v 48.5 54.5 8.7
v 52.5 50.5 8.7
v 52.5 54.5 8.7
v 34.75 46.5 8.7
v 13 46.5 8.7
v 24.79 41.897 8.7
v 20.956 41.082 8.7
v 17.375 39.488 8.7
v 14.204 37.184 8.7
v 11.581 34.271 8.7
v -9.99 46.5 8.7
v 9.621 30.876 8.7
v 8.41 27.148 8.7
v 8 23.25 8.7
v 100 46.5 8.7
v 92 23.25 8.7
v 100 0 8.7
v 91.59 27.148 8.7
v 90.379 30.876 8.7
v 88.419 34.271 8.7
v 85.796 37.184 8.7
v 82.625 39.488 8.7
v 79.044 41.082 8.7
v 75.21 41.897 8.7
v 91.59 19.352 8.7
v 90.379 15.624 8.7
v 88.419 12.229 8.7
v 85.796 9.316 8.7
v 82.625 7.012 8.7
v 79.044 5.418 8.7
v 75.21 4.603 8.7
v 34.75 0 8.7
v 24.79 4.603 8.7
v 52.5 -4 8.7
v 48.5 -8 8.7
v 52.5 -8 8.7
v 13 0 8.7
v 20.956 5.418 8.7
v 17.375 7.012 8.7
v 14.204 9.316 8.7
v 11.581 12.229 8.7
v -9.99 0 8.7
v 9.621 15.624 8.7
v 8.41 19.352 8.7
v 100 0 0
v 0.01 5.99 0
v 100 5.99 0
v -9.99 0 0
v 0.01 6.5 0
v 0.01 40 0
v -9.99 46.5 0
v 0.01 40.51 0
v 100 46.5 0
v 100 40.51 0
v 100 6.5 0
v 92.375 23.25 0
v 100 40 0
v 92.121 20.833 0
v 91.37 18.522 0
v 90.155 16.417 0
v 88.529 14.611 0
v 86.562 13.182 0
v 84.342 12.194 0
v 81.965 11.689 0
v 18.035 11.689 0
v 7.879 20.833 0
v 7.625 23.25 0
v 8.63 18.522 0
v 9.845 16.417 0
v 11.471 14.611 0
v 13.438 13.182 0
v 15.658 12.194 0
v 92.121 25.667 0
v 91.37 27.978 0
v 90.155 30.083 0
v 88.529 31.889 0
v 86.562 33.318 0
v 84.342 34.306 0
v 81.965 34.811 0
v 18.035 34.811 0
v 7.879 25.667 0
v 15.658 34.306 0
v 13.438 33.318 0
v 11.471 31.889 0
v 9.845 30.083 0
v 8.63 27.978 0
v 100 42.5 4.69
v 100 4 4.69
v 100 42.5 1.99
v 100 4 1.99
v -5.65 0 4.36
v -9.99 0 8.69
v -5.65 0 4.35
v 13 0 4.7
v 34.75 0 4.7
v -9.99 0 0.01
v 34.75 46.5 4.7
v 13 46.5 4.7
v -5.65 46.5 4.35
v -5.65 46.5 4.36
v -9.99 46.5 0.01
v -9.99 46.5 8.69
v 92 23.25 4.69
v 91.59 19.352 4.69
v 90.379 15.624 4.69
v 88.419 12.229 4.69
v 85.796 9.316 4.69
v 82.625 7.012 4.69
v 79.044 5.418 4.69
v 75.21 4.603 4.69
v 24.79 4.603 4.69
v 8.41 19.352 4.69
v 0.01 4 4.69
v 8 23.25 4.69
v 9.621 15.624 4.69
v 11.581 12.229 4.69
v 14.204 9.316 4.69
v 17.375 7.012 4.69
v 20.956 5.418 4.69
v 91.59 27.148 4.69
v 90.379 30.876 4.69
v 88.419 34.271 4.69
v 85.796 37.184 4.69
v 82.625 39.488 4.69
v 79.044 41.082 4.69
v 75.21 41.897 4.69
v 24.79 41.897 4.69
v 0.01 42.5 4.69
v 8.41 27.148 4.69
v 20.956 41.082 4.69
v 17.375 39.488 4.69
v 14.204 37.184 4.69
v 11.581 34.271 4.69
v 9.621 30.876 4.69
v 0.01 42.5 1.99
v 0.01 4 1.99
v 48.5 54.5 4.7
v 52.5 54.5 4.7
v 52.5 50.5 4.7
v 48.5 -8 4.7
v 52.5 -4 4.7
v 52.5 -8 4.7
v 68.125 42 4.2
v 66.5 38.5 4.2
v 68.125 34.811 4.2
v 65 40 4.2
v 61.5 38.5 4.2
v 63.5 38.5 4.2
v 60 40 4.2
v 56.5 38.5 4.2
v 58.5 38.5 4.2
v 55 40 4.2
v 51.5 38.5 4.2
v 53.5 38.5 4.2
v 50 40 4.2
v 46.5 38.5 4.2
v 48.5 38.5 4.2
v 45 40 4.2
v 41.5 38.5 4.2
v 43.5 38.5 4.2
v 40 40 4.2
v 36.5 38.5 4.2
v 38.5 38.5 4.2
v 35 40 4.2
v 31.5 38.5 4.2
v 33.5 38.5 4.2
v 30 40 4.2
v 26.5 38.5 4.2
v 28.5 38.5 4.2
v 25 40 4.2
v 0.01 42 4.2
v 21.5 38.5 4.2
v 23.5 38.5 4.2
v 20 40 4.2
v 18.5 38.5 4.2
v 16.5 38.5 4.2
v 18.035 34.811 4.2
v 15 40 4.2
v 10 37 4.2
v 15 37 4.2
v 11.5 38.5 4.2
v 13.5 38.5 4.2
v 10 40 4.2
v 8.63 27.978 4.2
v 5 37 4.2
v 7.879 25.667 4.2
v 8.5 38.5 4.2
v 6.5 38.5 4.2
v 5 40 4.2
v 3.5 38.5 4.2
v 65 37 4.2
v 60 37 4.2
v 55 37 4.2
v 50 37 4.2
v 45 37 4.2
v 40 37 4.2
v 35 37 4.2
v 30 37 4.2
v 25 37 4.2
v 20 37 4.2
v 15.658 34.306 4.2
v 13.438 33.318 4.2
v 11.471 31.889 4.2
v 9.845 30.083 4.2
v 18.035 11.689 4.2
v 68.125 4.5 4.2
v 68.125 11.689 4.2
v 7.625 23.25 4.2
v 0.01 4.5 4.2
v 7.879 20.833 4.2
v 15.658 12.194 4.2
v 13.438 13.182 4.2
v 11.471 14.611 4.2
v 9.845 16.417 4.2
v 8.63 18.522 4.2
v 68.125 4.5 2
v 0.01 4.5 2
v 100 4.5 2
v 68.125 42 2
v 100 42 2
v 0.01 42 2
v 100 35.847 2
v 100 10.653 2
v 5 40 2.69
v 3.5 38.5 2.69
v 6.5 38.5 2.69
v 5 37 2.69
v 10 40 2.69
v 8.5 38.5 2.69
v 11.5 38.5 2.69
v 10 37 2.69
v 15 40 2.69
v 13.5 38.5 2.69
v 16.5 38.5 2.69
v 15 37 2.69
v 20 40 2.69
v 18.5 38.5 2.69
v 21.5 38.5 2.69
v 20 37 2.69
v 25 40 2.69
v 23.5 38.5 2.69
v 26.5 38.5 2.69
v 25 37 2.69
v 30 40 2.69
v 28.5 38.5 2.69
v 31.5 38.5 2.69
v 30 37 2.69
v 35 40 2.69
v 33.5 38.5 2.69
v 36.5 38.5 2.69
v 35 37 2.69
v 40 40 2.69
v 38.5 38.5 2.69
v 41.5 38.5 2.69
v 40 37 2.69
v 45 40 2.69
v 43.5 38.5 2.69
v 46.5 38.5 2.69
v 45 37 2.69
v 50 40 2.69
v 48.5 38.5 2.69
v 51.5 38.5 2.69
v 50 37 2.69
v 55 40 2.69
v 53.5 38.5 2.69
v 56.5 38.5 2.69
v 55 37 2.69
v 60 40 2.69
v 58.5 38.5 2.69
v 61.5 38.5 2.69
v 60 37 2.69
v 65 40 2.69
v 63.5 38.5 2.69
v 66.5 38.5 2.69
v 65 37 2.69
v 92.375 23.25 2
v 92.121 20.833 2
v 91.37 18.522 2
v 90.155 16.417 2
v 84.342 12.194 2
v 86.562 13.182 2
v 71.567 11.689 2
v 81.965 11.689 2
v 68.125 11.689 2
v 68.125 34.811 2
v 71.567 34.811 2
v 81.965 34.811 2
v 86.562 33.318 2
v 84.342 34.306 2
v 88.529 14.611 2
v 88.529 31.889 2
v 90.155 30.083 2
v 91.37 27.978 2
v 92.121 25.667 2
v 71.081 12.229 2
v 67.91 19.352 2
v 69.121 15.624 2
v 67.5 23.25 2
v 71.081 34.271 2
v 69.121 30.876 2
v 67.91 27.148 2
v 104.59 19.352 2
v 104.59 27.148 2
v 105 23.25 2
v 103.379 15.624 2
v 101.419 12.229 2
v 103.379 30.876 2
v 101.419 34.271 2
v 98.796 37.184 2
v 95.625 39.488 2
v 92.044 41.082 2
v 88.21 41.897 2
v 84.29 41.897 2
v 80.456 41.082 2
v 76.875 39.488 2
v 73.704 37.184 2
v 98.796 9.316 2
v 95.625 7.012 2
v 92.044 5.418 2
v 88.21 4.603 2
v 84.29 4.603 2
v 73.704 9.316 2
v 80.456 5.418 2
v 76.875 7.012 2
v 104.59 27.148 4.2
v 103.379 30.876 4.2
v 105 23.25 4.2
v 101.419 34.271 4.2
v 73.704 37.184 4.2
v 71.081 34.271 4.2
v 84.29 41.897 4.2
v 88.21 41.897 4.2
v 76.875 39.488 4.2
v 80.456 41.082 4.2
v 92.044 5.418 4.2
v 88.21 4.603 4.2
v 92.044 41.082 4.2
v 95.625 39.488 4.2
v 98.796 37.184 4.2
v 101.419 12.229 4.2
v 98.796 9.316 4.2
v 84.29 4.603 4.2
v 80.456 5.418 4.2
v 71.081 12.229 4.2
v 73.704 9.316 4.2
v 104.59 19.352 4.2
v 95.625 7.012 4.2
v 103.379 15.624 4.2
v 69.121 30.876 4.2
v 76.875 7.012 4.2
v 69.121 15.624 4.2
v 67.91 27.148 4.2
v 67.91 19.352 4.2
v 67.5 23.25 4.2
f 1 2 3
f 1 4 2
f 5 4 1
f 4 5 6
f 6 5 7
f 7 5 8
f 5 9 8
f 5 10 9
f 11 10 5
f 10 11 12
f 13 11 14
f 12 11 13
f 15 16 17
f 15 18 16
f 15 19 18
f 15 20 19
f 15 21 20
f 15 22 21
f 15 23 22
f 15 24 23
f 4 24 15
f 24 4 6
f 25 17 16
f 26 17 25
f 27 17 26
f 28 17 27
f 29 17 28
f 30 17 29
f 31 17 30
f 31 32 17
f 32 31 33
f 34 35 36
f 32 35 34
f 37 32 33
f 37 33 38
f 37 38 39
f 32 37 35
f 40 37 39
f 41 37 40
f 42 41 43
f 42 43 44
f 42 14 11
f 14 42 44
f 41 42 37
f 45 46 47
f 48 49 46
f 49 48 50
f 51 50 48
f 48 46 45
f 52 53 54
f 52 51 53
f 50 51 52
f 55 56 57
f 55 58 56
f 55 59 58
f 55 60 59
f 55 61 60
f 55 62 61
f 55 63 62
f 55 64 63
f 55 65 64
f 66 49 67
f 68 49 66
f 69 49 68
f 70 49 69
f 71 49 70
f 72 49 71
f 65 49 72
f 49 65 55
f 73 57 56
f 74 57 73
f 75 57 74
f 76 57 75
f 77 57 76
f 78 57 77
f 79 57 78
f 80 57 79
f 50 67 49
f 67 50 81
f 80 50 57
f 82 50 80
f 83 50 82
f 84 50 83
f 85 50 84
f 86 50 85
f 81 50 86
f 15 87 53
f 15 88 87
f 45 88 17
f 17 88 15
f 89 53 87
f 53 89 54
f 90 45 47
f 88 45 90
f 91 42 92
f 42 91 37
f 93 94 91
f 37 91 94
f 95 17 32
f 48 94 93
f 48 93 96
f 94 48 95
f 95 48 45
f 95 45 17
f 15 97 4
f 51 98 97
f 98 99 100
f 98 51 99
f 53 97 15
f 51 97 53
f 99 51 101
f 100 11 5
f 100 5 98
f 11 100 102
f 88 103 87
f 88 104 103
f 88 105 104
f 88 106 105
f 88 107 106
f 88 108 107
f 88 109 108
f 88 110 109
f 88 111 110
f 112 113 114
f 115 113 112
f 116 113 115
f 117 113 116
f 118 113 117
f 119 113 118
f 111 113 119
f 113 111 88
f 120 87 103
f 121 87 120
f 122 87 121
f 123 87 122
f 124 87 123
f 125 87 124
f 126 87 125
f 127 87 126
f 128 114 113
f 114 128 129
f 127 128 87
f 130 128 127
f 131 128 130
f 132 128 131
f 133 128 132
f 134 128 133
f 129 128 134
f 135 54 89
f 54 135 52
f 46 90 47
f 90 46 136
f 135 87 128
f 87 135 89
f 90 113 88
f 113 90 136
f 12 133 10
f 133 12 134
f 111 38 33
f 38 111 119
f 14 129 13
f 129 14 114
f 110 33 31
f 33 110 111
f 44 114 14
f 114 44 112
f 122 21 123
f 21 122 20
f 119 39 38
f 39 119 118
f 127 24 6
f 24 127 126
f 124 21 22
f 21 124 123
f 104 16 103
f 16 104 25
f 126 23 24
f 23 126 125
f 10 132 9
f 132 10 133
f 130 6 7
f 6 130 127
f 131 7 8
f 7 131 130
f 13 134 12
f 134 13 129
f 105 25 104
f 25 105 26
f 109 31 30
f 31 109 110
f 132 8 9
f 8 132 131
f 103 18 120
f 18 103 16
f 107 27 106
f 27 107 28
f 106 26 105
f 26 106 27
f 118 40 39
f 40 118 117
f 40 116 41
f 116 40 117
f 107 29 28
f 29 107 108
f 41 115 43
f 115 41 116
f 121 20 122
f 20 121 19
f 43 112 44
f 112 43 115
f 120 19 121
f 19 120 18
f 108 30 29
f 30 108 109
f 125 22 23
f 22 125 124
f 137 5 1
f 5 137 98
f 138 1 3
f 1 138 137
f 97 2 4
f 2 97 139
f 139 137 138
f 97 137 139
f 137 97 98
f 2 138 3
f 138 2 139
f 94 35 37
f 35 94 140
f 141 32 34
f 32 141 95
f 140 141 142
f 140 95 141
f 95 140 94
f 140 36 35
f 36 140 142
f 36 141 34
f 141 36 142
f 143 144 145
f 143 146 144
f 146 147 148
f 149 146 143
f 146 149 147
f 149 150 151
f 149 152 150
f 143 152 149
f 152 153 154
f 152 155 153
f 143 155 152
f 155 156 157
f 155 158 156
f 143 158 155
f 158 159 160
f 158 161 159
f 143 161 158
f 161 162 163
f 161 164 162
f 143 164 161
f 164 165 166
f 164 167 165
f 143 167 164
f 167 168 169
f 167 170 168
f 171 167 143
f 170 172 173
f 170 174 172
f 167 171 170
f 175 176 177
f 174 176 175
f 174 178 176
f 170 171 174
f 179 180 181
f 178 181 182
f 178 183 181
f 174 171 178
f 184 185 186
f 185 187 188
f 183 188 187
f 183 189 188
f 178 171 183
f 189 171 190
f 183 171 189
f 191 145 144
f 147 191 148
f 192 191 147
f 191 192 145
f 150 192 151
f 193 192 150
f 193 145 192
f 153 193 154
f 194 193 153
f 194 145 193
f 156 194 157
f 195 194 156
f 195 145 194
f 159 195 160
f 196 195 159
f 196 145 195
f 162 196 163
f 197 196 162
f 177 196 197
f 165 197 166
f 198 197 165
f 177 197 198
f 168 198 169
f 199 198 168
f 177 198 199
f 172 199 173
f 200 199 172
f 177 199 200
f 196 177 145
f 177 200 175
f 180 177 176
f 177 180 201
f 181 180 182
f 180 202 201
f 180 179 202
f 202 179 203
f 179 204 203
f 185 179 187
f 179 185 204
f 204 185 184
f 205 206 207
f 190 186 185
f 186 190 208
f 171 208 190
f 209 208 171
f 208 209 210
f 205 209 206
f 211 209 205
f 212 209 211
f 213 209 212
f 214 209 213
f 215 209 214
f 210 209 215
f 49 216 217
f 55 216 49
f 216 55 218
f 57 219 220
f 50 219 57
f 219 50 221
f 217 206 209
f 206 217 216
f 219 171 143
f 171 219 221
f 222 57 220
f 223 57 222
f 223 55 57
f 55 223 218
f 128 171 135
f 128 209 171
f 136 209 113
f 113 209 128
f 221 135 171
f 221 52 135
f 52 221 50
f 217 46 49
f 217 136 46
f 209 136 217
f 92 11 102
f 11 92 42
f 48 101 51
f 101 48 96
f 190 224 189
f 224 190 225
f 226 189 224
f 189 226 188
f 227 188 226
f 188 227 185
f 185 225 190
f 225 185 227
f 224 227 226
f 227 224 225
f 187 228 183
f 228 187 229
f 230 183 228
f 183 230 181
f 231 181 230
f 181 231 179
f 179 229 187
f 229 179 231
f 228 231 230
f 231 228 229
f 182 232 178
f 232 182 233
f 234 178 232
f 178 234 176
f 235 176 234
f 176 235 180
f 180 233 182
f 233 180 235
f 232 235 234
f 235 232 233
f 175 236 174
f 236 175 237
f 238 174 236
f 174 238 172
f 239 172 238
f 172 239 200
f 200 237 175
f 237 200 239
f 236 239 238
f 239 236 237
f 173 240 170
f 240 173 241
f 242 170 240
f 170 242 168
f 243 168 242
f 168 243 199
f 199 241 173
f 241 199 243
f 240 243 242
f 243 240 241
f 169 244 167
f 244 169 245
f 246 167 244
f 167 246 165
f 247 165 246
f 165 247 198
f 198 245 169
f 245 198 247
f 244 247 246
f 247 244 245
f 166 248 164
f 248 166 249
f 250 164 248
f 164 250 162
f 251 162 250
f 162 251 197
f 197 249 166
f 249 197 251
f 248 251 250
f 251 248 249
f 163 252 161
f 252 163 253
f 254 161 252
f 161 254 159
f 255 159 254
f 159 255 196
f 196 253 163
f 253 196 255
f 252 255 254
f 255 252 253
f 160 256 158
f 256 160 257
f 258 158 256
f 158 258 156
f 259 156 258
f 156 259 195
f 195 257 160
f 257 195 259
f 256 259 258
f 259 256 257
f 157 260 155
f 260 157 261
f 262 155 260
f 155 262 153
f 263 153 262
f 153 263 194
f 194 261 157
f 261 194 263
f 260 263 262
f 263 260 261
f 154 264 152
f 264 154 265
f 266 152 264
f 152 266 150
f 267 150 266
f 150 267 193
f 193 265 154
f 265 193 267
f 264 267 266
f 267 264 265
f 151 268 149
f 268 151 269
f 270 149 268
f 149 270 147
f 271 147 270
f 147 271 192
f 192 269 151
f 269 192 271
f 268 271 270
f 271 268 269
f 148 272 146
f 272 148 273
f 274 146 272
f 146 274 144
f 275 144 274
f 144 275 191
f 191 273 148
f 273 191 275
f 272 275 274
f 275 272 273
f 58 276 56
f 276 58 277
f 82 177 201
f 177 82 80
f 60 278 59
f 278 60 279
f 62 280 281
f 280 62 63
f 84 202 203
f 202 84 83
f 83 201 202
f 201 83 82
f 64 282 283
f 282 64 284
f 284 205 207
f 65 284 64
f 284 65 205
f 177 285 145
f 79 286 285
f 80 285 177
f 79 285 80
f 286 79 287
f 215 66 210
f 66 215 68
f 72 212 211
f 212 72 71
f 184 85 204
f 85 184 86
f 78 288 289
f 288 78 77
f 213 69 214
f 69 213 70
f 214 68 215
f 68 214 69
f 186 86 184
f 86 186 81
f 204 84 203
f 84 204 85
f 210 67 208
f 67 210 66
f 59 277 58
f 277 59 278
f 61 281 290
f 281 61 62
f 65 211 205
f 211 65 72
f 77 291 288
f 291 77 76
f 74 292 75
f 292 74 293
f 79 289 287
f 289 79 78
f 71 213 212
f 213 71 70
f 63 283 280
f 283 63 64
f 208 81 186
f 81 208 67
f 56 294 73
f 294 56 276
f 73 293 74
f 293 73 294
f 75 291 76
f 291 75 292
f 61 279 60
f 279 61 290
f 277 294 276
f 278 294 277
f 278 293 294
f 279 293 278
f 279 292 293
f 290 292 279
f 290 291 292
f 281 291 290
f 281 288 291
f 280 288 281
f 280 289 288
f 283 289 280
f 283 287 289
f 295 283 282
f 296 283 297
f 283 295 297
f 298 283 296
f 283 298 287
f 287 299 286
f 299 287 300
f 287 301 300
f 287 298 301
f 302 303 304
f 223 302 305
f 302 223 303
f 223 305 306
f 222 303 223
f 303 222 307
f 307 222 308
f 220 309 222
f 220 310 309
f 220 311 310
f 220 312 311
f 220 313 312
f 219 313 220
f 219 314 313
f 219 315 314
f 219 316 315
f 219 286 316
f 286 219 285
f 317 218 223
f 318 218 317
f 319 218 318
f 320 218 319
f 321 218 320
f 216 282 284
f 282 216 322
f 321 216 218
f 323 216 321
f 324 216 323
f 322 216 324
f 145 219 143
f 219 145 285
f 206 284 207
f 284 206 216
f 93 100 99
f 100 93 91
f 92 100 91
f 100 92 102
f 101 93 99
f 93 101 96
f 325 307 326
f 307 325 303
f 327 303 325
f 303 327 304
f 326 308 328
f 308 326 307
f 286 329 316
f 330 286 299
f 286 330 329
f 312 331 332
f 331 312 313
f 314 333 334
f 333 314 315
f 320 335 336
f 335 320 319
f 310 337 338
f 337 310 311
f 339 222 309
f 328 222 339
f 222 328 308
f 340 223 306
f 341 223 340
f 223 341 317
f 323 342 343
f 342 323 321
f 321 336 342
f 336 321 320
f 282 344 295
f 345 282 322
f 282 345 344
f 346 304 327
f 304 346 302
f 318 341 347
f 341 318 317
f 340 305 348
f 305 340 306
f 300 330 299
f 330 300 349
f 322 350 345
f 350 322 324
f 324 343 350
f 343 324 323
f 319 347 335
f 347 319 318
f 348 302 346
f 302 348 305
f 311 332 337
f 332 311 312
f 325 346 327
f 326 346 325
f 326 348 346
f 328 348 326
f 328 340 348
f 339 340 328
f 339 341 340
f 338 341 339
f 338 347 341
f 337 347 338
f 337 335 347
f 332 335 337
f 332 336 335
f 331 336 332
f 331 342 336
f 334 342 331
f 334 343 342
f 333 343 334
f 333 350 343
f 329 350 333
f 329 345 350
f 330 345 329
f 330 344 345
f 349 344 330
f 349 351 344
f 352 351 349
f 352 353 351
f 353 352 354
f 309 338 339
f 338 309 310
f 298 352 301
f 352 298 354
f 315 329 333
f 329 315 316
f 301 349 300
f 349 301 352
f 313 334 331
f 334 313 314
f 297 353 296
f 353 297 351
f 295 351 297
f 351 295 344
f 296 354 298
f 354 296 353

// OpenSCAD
// Poker chip shooter
// Middle school physics, elastic potential energy lab
// OpenScad script--Free download for Windows/Mac/Linux
//   .. Programatically design objects.
//   .. GUI 3d sketch products are soo 1990.
//   .. Only thing cooler is manifoldcad.org and the manifold project.

tiny=.01;
gap=.5; 
ledge=2; // Under projectile
projectile=[37.5,37.5,2.2]; // poker chip
//projectile=[25.7,25.7,7.8+gap]; // domino
bore=[100,projectile.x,projectile.z];
thick=4;
barrel=[100,projectile.y+gap*2+thick*2,projectile.z+gap+ledge+thick];
width=projectile.y+gap*2;

module Clip(dir){
  // Rubber band clips on barrel
  gap=1;
  c=[thick,thick,thick];
  width=projectile.y+gap*2;
  translate([width+thick*2,0,barrel.z-thick])
  hull(){
    translate([width-thick,0,0])
    cube(c);
    translate([0,dir*(thick+gap*4),0])
    cube(c);
  }
}

module Clips(){
  Clip(-1);
  translate([0,barrel.y-thick,0])
  Clip(1);
}

module Bore(cut=0){
  translate([-tiny*cut,(1-cut)*gap,-tiny*cut])
  hull(){
    translate([0,thick,ledge])
    cube(bore+[cut*tiny*2,cut*gap*2,cut*gap]);
    translate([0,thick+ledge,0])
    cube(bore+[cut*tiny*2,cut*gap*2-ledge*2,0]);
  }
}

module Barrel(){
  z=barrel.z+thick;
  c=projectile.x/2+thick*2;
  module CutCyl(){
    translate([0,barrel.y/2,projectile.z+ledge])
    cylinder(d=bore.y,h=barrel.z+thick*2);
  }
  difference(){
    cube(barrel);
    Bore(cut=1);
    // Cutout to save material and view
    hull(){
      translate([c,0,0])
      CutCyl();
      translate([barrel.x-c,0,0])
      CutCyl();
    }
  }
  Clips();
}

module Hammer(){
  back=10;
  module CutCyl(){
    translate([width/2,barrel.y/2,-tiny])
    cylinder(d=barrel.y/2,h=barrel.z+thick*2);
  }
  difference(){
    union(){
      z=barrel.z-gap;
      Bore();
      // Back grip
      translate([-back+tiny,0,0,])
      cube([back,barrel.y,barrel.z]);
    }
    // Cutout to save material
    hull(){
      CutCyl();
      translate([barrel.x-width,0,0])
      CutCyl();
    }
    // Cut ledge
    translate([barrel.x-projectile.x*.85,thick,ledge])
    cube([projectile.x,bore.y+gap*2,barrel.z]);
    // Half-centimeter ruler
    translate([0,barrel.y-thick-4,-tiny])
    for(i=[1:13]){
      translate([i*5,0,barrel.z-6])
      cylinder(d=3,h=3,$fn=4);
    }
    // Back grip, groove for rubber band
    hull(){
      z=barrel.z;
      translate([-back-tiny,-tiny,0,])
      cube([tiny,barrel.y+tiny*2,z]);
      translate([-back-tiny+z/2,-tiny,z/2])
      cube([tiny,barrel.y+tiny*2,tiny]);
    }
  }  
}

module Projectile(){
  translate([barrel.x-projectile.x/2+5,barrel.y/2,ledge])
  cylinder(d=projectile.x,h=projectile.z);
}

module Assembled(){
  //rotate([0,180,0])
  rotate([0,0,180])
  translate([-barrel.x,-barrel.y,0])
  //translate([-barrel.x,0,-(barrel.z+thick)])
  Barrel();
  //translate([3,0,0])
  Hammer();
  Projectile();
}

module Print(){
  rotate([180,0,0])
  translate([0,thick*1.5,-barrel.z])
  Barrel();
  Hammer();
}

// Uncomment ONE line:

//Print();
Assembled();
//Hammer();
//rotate([180,0,0]) Barrel();
